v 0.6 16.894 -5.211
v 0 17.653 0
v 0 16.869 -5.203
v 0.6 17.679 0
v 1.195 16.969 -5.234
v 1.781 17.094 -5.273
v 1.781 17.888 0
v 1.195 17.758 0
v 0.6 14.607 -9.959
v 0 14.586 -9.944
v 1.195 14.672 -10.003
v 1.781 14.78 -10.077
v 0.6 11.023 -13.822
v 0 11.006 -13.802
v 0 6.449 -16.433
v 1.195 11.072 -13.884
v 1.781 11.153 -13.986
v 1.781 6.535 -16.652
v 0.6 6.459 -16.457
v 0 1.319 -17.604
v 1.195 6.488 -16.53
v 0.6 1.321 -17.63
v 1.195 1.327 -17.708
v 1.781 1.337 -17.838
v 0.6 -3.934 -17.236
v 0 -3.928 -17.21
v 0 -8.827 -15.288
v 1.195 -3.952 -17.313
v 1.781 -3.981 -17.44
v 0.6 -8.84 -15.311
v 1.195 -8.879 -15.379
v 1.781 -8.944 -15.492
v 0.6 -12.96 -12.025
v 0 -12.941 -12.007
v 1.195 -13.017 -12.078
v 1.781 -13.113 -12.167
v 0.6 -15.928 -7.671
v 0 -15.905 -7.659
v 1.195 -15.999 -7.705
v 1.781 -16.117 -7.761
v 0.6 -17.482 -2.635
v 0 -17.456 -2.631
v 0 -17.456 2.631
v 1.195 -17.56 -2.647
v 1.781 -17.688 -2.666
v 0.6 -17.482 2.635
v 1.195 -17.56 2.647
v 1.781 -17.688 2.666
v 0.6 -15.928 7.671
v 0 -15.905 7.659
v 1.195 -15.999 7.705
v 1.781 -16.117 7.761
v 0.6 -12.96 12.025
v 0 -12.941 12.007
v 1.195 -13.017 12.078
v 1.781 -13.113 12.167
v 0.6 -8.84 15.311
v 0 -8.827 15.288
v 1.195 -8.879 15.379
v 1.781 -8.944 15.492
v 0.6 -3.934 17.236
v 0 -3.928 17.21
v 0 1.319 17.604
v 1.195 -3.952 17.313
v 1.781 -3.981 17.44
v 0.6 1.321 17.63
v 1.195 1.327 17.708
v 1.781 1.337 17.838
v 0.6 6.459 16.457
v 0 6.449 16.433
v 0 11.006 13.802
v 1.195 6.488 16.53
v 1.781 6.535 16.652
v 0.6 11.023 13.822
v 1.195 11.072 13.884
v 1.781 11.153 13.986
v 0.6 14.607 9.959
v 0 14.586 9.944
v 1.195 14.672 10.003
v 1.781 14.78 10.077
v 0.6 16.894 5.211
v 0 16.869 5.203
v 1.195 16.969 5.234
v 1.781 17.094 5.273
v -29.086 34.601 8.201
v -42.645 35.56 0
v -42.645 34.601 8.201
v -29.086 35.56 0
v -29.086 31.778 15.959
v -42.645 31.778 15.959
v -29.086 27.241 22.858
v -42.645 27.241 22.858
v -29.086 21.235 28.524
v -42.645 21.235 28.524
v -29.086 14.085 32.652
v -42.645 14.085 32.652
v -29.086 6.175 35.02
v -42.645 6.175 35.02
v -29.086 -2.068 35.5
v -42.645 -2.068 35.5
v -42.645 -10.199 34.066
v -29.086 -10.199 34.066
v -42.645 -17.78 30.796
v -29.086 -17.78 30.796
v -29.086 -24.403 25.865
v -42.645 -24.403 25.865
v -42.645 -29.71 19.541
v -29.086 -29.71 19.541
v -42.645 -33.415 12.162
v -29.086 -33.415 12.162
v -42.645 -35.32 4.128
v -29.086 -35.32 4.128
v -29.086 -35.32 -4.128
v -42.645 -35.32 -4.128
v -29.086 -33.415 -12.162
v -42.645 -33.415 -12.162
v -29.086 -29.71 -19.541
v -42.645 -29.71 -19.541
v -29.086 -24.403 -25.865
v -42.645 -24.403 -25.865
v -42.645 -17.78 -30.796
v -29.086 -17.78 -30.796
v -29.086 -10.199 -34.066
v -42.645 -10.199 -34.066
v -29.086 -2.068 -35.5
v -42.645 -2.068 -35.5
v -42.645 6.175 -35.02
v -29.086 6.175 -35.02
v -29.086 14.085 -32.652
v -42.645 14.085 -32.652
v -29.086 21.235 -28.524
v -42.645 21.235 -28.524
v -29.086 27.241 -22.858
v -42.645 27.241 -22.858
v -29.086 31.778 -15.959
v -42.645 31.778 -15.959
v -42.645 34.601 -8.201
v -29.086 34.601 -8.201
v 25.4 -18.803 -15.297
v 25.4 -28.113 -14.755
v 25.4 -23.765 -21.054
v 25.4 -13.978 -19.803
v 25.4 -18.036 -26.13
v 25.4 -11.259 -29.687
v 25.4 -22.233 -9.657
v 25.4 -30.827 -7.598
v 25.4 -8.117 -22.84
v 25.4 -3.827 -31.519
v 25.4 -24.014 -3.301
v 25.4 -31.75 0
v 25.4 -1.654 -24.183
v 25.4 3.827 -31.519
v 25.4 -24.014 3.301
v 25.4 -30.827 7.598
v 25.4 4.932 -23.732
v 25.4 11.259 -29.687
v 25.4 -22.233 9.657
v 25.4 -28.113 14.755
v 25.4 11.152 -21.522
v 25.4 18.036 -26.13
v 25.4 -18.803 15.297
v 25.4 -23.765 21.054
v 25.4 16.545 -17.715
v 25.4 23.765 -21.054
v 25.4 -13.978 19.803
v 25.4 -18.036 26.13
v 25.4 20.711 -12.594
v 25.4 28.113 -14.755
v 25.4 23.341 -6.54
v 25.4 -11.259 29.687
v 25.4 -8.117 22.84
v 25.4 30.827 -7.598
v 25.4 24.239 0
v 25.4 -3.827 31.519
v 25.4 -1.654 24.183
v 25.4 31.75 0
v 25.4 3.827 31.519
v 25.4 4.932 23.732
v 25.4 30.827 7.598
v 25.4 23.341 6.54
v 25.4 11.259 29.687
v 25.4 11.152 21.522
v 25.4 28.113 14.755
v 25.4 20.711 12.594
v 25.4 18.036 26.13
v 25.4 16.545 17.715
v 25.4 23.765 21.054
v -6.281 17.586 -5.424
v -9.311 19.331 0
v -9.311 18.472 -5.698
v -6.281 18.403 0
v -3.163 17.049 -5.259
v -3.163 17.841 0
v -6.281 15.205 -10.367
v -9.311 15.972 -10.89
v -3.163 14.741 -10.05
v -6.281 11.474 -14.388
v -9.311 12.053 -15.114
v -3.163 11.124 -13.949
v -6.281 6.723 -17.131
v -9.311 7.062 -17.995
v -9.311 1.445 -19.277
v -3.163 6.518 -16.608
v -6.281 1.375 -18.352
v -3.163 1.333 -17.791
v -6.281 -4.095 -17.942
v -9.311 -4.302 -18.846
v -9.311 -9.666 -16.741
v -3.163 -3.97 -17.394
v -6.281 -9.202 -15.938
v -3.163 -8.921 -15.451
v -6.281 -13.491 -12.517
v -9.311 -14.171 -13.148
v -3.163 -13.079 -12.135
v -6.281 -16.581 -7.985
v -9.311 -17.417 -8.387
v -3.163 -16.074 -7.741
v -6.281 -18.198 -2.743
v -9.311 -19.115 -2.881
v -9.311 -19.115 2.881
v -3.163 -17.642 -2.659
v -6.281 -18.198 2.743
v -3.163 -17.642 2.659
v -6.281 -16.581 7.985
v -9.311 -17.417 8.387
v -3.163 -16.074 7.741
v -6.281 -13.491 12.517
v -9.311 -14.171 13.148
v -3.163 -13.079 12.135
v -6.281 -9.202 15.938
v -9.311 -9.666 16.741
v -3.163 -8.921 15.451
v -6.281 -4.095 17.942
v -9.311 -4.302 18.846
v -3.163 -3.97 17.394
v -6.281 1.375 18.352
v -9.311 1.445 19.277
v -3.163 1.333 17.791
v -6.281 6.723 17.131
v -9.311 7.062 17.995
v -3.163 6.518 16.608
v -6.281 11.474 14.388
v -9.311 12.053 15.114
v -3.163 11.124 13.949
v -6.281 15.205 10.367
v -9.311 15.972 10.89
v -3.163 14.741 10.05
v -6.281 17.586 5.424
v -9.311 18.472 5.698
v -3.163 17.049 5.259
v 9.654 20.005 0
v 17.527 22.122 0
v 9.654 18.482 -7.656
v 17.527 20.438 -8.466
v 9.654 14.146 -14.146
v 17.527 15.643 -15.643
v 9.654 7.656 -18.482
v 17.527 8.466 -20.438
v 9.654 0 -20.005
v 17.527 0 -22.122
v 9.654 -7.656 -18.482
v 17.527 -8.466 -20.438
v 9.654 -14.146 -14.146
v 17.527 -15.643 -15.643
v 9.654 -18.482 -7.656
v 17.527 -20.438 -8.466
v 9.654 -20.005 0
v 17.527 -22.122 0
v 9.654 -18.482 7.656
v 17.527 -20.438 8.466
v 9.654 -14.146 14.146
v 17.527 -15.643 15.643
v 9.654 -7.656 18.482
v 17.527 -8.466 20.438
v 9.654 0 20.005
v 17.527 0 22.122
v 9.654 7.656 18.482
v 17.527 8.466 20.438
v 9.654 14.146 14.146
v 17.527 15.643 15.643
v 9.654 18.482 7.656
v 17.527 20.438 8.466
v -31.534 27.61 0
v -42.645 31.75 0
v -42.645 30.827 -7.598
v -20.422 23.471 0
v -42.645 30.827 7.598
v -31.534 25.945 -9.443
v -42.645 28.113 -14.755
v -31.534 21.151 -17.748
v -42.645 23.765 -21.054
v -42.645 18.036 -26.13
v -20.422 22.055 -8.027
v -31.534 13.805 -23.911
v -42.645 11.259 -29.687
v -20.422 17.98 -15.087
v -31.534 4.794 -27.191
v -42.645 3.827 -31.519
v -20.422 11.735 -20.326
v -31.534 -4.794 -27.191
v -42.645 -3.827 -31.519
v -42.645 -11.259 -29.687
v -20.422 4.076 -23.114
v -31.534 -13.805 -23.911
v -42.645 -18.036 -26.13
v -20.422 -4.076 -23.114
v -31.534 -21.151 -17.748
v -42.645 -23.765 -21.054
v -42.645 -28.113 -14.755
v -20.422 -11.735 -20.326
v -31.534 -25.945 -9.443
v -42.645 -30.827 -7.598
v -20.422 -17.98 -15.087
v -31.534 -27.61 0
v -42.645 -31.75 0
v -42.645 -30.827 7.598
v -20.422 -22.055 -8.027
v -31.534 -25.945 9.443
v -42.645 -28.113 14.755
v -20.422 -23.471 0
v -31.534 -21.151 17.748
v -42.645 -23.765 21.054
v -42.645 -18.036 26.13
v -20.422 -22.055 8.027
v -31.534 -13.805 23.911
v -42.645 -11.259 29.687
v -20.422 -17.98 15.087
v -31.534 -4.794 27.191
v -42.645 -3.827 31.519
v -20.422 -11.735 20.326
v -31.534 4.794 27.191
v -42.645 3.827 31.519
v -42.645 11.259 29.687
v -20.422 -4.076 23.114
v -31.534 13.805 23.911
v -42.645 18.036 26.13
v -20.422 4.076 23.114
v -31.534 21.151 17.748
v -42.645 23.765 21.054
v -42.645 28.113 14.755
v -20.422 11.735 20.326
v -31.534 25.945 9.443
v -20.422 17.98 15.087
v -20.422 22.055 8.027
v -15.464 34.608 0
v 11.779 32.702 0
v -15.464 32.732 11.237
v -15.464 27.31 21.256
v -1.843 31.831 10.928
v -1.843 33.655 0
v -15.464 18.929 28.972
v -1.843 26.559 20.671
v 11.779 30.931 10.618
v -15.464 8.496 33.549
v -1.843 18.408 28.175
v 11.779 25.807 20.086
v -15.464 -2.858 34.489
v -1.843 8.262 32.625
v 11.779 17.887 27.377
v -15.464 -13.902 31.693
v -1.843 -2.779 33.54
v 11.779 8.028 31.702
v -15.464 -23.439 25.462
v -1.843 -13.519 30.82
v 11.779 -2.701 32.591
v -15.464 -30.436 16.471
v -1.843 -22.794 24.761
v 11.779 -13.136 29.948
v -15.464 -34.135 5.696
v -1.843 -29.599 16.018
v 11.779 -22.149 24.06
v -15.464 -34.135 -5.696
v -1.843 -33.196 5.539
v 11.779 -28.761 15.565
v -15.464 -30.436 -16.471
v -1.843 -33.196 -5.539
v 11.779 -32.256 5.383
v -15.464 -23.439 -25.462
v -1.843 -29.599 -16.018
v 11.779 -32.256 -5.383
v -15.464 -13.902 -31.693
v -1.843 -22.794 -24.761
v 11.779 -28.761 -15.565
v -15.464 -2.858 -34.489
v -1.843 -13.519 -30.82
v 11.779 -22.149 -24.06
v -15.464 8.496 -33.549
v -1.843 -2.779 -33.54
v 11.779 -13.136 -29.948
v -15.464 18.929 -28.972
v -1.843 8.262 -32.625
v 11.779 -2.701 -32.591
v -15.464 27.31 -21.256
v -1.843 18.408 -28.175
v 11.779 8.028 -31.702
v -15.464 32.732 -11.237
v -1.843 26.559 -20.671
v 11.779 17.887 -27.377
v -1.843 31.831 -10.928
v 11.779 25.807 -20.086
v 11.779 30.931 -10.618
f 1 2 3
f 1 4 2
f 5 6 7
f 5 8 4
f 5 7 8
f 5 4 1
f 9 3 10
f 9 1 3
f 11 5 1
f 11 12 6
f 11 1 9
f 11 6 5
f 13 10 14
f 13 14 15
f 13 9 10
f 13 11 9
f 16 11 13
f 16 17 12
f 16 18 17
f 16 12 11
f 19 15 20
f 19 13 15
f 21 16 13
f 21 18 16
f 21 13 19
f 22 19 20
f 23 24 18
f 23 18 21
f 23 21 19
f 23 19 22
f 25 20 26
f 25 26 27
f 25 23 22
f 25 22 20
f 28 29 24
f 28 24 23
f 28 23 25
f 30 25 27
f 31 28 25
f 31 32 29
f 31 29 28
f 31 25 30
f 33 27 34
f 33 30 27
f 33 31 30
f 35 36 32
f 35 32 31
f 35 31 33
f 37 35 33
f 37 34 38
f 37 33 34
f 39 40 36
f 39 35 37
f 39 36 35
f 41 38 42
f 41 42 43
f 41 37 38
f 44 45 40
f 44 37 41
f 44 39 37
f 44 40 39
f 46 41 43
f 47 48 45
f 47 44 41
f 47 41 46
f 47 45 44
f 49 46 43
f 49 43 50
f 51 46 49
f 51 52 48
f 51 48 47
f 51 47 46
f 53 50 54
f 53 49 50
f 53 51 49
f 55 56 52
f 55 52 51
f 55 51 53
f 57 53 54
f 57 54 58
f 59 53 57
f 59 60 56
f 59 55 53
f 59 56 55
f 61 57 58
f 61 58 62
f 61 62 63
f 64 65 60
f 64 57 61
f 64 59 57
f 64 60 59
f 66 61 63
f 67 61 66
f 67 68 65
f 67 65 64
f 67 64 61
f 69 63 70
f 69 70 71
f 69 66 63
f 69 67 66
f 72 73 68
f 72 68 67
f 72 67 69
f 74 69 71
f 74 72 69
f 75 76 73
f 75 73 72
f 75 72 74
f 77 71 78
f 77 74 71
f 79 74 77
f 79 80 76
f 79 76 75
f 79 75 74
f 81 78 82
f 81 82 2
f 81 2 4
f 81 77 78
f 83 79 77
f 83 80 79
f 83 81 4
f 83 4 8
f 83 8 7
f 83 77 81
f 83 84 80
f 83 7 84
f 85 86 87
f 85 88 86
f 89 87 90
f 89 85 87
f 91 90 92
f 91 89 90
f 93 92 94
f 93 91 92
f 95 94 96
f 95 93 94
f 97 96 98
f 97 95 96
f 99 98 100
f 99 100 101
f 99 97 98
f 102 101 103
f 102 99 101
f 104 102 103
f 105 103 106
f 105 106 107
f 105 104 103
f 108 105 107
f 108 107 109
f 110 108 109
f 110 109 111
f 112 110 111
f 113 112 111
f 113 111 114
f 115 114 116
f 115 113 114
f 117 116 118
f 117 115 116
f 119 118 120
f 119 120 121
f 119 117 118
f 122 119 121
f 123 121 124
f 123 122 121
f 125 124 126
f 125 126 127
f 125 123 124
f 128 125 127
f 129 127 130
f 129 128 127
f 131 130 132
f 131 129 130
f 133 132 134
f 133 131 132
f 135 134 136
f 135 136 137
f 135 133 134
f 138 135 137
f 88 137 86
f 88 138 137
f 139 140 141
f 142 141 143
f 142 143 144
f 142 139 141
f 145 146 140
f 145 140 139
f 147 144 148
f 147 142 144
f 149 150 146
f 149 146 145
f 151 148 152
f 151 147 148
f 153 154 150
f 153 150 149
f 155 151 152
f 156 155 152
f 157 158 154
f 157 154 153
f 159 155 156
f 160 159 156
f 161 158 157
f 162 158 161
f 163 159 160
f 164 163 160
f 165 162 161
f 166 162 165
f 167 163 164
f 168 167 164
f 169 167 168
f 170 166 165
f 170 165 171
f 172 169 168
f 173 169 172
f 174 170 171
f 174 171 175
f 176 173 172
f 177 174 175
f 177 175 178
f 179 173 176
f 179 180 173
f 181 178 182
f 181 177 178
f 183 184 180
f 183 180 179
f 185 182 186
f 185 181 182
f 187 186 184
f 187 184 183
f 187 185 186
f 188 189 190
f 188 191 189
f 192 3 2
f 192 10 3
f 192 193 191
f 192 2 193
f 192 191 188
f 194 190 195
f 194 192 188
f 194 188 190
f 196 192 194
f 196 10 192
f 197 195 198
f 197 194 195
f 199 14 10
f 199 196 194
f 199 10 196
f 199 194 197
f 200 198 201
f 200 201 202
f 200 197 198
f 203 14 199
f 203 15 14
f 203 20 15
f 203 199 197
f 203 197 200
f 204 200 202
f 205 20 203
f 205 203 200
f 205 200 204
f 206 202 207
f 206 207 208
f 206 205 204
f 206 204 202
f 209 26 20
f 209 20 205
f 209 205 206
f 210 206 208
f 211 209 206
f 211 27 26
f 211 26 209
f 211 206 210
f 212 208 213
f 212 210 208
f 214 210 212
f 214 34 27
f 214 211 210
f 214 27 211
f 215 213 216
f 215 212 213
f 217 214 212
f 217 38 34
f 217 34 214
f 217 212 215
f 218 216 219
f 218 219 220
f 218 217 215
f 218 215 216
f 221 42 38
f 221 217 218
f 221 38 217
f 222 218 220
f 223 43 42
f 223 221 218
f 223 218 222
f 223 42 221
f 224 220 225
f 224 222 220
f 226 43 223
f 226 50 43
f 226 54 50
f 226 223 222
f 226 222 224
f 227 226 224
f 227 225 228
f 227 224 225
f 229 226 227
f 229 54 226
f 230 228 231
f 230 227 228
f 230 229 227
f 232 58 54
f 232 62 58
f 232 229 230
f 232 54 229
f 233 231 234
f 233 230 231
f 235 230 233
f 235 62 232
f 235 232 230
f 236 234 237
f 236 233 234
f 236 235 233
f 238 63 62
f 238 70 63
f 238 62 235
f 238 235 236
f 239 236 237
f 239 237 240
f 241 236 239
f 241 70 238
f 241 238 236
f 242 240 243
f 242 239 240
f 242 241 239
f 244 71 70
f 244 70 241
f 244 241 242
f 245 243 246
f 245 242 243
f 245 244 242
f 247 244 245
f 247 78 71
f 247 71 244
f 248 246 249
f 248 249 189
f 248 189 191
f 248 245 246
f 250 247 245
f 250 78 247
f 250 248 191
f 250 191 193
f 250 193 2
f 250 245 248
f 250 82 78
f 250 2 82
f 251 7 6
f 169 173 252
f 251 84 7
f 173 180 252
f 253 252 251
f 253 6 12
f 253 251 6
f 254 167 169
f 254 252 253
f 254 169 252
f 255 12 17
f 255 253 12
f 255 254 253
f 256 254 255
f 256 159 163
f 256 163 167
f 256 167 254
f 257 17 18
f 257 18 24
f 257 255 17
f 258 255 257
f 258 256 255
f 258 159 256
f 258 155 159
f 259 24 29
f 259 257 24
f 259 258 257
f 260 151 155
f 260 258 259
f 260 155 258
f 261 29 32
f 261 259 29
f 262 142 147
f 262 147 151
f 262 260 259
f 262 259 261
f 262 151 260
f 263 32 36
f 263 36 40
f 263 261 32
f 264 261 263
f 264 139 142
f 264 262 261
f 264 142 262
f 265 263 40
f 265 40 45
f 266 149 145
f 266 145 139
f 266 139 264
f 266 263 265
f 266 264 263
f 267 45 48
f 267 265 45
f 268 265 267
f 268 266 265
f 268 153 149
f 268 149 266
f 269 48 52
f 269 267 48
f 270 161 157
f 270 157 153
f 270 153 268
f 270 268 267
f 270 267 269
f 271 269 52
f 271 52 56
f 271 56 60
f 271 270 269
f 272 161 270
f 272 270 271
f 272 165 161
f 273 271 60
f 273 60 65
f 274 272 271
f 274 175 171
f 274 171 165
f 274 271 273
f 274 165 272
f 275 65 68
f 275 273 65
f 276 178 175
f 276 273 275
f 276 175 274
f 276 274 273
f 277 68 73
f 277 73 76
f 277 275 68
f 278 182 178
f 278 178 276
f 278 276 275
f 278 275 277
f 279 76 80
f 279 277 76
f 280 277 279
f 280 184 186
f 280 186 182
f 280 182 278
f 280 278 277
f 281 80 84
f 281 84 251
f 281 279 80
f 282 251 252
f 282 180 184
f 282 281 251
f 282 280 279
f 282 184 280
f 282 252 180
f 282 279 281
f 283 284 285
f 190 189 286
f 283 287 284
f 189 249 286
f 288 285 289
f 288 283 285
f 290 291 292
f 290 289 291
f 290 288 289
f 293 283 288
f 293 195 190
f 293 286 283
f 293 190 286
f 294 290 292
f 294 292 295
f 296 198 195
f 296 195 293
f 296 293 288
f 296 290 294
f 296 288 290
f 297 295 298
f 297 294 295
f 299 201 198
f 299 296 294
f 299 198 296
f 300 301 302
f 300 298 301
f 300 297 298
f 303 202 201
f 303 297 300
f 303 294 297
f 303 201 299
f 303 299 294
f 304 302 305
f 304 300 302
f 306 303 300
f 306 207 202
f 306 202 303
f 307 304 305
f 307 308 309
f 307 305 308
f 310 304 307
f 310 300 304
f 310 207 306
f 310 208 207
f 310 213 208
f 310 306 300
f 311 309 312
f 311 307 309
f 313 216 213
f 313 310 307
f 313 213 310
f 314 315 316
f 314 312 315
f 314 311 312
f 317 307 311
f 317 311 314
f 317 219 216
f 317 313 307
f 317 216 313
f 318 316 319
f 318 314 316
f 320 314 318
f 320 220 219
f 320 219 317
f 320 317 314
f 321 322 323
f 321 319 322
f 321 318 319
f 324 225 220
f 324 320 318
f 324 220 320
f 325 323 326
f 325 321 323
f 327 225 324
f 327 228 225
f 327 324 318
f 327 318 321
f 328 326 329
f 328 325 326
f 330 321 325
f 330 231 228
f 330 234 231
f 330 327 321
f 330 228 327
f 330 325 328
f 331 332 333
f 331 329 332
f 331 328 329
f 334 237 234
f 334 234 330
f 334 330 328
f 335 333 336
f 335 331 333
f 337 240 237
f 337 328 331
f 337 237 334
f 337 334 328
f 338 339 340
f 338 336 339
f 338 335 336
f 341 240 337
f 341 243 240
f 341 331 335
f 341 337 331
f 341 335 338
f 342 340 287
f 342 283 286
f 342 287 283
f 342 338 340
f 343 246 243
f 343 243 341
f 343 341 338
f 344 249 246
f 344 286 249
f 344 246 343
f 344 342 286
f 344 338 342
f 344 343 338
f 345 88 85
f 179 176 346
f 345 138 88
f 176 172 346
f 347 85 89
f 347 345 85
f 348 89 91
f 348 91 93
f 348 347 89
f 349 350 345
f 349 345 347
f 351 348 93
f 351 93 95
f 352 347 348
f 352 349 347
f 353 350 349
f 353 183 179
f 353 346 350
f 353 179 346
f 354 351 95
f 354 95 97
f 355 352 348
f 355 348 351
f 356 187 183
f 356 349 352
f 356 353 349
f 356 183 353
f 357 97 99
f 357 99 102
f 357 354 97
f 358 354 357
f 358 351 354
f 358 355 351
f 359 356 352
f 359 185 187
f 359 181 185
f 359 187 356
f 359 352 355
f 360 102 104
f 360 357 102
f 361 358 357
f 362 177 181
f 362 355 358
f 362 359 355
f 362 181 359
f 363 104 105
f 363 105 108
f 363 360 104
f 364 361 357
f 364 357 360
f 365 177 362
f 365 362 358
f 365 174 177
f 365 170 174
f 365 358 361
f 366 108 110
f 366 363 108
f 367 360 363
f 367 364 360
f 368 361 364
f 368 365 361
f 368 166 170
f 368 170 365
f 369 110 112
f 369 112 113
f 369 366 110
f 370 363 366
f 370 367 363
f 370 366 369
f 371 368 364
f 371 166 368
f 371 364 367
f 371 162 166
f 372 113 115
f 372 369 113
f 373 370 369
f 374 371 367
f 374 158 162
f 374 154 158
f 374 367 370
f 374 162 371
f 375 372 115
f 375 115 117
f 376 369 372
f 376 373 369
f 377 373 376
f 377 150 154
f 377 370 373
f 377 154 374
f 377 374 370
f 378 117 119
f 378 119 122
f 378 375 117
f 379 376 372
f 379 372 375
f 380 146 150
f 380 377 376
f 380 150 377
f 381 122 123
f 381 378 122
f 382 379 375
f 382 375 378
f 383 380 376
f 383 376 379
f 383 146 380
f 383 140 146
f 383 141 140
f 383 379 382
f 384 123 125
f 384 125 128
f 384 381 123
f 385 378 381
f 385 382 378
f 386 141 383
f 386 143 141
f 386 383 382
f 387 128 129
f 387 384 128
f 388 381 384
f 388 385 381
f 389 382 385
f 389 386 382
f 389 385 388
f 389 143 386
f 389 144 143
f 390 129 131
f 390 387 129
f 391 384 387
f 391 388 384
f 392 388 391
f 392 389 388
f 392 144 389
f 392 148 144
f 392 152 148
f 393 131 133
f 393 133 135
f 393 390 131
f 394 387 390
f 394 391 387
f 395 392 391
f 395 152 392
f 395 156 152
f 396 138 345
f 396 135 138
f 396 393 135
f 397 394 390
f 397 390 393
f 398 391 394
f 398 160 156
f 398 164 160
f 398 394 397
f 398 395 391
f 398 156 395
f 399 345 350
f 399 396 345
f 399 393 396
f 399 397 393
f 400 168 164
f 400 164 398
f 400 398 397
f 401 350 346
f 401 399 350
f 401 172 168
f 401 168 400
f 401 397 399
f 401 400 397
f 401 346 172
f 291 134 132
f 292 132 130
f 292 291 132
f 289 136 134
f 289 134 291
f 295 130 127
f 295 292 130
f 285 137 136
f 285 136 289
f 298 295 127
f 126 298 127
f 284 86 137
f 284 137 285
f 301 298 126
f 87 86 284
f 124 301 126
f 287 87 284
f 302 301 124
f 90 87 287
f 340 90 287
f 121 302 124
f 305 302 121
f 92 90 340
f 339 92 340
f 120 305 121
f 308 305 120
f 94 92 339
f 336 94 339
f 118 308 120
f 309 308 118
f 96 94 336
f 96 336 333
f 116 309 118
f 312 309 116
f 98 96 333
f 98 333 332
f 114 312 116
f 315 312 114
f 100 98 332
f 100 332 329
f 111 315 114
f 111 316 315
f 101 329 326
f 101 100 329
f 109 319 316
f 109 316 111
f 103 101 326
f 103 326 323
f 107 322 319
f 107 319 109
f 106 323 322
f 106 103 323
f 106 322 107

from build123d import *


with BuildPart() as part:
    # Sketch1 → Revolve1 (revolve)
    with BuildSketch(Plane.XY):
        with BuildLine():
            ThreePointArc((-9.310840107, 19.331058169), (-4.730423414, 18.075866931), (0, 17.653))
            ThreePointArc((0, 17.653), (0.898160183, 17.712068298), (1.780848569, 17.888255676))
            Line((1.780848569, 17.888255676), (90.17, 41.656))
            Line((90.17, 41.656), (-59.69, 38.1))
            Line((-59.69, 38.1), (-9.310840107, 19.331058169))
        make_face()
    revolve(axis=Axis((0, 0, 0), (-1, 0, 0)))

    # Sketch2 → Cut-Revolve1 (revolve, cut)
    with BuildSketch(Plane.XY):
        Polygon((-29.085538438, 35.56), (25.4, 31.75), (25.4, 0), (94.515783367, 0), (94.515783367, 51.74538216), (-80.408492958, 51.74538216), (-80.408492958, 0), (-50.8, 0), (-50.8, 31.75), (-42.645476755, 31.75), (-42.645476755, 35.56), align=None)
    revolve(axis=Axis((-50.8, 0, 0), (1, 0, 0)), mode=Mode.SUBTRACT)


solid = part.part
